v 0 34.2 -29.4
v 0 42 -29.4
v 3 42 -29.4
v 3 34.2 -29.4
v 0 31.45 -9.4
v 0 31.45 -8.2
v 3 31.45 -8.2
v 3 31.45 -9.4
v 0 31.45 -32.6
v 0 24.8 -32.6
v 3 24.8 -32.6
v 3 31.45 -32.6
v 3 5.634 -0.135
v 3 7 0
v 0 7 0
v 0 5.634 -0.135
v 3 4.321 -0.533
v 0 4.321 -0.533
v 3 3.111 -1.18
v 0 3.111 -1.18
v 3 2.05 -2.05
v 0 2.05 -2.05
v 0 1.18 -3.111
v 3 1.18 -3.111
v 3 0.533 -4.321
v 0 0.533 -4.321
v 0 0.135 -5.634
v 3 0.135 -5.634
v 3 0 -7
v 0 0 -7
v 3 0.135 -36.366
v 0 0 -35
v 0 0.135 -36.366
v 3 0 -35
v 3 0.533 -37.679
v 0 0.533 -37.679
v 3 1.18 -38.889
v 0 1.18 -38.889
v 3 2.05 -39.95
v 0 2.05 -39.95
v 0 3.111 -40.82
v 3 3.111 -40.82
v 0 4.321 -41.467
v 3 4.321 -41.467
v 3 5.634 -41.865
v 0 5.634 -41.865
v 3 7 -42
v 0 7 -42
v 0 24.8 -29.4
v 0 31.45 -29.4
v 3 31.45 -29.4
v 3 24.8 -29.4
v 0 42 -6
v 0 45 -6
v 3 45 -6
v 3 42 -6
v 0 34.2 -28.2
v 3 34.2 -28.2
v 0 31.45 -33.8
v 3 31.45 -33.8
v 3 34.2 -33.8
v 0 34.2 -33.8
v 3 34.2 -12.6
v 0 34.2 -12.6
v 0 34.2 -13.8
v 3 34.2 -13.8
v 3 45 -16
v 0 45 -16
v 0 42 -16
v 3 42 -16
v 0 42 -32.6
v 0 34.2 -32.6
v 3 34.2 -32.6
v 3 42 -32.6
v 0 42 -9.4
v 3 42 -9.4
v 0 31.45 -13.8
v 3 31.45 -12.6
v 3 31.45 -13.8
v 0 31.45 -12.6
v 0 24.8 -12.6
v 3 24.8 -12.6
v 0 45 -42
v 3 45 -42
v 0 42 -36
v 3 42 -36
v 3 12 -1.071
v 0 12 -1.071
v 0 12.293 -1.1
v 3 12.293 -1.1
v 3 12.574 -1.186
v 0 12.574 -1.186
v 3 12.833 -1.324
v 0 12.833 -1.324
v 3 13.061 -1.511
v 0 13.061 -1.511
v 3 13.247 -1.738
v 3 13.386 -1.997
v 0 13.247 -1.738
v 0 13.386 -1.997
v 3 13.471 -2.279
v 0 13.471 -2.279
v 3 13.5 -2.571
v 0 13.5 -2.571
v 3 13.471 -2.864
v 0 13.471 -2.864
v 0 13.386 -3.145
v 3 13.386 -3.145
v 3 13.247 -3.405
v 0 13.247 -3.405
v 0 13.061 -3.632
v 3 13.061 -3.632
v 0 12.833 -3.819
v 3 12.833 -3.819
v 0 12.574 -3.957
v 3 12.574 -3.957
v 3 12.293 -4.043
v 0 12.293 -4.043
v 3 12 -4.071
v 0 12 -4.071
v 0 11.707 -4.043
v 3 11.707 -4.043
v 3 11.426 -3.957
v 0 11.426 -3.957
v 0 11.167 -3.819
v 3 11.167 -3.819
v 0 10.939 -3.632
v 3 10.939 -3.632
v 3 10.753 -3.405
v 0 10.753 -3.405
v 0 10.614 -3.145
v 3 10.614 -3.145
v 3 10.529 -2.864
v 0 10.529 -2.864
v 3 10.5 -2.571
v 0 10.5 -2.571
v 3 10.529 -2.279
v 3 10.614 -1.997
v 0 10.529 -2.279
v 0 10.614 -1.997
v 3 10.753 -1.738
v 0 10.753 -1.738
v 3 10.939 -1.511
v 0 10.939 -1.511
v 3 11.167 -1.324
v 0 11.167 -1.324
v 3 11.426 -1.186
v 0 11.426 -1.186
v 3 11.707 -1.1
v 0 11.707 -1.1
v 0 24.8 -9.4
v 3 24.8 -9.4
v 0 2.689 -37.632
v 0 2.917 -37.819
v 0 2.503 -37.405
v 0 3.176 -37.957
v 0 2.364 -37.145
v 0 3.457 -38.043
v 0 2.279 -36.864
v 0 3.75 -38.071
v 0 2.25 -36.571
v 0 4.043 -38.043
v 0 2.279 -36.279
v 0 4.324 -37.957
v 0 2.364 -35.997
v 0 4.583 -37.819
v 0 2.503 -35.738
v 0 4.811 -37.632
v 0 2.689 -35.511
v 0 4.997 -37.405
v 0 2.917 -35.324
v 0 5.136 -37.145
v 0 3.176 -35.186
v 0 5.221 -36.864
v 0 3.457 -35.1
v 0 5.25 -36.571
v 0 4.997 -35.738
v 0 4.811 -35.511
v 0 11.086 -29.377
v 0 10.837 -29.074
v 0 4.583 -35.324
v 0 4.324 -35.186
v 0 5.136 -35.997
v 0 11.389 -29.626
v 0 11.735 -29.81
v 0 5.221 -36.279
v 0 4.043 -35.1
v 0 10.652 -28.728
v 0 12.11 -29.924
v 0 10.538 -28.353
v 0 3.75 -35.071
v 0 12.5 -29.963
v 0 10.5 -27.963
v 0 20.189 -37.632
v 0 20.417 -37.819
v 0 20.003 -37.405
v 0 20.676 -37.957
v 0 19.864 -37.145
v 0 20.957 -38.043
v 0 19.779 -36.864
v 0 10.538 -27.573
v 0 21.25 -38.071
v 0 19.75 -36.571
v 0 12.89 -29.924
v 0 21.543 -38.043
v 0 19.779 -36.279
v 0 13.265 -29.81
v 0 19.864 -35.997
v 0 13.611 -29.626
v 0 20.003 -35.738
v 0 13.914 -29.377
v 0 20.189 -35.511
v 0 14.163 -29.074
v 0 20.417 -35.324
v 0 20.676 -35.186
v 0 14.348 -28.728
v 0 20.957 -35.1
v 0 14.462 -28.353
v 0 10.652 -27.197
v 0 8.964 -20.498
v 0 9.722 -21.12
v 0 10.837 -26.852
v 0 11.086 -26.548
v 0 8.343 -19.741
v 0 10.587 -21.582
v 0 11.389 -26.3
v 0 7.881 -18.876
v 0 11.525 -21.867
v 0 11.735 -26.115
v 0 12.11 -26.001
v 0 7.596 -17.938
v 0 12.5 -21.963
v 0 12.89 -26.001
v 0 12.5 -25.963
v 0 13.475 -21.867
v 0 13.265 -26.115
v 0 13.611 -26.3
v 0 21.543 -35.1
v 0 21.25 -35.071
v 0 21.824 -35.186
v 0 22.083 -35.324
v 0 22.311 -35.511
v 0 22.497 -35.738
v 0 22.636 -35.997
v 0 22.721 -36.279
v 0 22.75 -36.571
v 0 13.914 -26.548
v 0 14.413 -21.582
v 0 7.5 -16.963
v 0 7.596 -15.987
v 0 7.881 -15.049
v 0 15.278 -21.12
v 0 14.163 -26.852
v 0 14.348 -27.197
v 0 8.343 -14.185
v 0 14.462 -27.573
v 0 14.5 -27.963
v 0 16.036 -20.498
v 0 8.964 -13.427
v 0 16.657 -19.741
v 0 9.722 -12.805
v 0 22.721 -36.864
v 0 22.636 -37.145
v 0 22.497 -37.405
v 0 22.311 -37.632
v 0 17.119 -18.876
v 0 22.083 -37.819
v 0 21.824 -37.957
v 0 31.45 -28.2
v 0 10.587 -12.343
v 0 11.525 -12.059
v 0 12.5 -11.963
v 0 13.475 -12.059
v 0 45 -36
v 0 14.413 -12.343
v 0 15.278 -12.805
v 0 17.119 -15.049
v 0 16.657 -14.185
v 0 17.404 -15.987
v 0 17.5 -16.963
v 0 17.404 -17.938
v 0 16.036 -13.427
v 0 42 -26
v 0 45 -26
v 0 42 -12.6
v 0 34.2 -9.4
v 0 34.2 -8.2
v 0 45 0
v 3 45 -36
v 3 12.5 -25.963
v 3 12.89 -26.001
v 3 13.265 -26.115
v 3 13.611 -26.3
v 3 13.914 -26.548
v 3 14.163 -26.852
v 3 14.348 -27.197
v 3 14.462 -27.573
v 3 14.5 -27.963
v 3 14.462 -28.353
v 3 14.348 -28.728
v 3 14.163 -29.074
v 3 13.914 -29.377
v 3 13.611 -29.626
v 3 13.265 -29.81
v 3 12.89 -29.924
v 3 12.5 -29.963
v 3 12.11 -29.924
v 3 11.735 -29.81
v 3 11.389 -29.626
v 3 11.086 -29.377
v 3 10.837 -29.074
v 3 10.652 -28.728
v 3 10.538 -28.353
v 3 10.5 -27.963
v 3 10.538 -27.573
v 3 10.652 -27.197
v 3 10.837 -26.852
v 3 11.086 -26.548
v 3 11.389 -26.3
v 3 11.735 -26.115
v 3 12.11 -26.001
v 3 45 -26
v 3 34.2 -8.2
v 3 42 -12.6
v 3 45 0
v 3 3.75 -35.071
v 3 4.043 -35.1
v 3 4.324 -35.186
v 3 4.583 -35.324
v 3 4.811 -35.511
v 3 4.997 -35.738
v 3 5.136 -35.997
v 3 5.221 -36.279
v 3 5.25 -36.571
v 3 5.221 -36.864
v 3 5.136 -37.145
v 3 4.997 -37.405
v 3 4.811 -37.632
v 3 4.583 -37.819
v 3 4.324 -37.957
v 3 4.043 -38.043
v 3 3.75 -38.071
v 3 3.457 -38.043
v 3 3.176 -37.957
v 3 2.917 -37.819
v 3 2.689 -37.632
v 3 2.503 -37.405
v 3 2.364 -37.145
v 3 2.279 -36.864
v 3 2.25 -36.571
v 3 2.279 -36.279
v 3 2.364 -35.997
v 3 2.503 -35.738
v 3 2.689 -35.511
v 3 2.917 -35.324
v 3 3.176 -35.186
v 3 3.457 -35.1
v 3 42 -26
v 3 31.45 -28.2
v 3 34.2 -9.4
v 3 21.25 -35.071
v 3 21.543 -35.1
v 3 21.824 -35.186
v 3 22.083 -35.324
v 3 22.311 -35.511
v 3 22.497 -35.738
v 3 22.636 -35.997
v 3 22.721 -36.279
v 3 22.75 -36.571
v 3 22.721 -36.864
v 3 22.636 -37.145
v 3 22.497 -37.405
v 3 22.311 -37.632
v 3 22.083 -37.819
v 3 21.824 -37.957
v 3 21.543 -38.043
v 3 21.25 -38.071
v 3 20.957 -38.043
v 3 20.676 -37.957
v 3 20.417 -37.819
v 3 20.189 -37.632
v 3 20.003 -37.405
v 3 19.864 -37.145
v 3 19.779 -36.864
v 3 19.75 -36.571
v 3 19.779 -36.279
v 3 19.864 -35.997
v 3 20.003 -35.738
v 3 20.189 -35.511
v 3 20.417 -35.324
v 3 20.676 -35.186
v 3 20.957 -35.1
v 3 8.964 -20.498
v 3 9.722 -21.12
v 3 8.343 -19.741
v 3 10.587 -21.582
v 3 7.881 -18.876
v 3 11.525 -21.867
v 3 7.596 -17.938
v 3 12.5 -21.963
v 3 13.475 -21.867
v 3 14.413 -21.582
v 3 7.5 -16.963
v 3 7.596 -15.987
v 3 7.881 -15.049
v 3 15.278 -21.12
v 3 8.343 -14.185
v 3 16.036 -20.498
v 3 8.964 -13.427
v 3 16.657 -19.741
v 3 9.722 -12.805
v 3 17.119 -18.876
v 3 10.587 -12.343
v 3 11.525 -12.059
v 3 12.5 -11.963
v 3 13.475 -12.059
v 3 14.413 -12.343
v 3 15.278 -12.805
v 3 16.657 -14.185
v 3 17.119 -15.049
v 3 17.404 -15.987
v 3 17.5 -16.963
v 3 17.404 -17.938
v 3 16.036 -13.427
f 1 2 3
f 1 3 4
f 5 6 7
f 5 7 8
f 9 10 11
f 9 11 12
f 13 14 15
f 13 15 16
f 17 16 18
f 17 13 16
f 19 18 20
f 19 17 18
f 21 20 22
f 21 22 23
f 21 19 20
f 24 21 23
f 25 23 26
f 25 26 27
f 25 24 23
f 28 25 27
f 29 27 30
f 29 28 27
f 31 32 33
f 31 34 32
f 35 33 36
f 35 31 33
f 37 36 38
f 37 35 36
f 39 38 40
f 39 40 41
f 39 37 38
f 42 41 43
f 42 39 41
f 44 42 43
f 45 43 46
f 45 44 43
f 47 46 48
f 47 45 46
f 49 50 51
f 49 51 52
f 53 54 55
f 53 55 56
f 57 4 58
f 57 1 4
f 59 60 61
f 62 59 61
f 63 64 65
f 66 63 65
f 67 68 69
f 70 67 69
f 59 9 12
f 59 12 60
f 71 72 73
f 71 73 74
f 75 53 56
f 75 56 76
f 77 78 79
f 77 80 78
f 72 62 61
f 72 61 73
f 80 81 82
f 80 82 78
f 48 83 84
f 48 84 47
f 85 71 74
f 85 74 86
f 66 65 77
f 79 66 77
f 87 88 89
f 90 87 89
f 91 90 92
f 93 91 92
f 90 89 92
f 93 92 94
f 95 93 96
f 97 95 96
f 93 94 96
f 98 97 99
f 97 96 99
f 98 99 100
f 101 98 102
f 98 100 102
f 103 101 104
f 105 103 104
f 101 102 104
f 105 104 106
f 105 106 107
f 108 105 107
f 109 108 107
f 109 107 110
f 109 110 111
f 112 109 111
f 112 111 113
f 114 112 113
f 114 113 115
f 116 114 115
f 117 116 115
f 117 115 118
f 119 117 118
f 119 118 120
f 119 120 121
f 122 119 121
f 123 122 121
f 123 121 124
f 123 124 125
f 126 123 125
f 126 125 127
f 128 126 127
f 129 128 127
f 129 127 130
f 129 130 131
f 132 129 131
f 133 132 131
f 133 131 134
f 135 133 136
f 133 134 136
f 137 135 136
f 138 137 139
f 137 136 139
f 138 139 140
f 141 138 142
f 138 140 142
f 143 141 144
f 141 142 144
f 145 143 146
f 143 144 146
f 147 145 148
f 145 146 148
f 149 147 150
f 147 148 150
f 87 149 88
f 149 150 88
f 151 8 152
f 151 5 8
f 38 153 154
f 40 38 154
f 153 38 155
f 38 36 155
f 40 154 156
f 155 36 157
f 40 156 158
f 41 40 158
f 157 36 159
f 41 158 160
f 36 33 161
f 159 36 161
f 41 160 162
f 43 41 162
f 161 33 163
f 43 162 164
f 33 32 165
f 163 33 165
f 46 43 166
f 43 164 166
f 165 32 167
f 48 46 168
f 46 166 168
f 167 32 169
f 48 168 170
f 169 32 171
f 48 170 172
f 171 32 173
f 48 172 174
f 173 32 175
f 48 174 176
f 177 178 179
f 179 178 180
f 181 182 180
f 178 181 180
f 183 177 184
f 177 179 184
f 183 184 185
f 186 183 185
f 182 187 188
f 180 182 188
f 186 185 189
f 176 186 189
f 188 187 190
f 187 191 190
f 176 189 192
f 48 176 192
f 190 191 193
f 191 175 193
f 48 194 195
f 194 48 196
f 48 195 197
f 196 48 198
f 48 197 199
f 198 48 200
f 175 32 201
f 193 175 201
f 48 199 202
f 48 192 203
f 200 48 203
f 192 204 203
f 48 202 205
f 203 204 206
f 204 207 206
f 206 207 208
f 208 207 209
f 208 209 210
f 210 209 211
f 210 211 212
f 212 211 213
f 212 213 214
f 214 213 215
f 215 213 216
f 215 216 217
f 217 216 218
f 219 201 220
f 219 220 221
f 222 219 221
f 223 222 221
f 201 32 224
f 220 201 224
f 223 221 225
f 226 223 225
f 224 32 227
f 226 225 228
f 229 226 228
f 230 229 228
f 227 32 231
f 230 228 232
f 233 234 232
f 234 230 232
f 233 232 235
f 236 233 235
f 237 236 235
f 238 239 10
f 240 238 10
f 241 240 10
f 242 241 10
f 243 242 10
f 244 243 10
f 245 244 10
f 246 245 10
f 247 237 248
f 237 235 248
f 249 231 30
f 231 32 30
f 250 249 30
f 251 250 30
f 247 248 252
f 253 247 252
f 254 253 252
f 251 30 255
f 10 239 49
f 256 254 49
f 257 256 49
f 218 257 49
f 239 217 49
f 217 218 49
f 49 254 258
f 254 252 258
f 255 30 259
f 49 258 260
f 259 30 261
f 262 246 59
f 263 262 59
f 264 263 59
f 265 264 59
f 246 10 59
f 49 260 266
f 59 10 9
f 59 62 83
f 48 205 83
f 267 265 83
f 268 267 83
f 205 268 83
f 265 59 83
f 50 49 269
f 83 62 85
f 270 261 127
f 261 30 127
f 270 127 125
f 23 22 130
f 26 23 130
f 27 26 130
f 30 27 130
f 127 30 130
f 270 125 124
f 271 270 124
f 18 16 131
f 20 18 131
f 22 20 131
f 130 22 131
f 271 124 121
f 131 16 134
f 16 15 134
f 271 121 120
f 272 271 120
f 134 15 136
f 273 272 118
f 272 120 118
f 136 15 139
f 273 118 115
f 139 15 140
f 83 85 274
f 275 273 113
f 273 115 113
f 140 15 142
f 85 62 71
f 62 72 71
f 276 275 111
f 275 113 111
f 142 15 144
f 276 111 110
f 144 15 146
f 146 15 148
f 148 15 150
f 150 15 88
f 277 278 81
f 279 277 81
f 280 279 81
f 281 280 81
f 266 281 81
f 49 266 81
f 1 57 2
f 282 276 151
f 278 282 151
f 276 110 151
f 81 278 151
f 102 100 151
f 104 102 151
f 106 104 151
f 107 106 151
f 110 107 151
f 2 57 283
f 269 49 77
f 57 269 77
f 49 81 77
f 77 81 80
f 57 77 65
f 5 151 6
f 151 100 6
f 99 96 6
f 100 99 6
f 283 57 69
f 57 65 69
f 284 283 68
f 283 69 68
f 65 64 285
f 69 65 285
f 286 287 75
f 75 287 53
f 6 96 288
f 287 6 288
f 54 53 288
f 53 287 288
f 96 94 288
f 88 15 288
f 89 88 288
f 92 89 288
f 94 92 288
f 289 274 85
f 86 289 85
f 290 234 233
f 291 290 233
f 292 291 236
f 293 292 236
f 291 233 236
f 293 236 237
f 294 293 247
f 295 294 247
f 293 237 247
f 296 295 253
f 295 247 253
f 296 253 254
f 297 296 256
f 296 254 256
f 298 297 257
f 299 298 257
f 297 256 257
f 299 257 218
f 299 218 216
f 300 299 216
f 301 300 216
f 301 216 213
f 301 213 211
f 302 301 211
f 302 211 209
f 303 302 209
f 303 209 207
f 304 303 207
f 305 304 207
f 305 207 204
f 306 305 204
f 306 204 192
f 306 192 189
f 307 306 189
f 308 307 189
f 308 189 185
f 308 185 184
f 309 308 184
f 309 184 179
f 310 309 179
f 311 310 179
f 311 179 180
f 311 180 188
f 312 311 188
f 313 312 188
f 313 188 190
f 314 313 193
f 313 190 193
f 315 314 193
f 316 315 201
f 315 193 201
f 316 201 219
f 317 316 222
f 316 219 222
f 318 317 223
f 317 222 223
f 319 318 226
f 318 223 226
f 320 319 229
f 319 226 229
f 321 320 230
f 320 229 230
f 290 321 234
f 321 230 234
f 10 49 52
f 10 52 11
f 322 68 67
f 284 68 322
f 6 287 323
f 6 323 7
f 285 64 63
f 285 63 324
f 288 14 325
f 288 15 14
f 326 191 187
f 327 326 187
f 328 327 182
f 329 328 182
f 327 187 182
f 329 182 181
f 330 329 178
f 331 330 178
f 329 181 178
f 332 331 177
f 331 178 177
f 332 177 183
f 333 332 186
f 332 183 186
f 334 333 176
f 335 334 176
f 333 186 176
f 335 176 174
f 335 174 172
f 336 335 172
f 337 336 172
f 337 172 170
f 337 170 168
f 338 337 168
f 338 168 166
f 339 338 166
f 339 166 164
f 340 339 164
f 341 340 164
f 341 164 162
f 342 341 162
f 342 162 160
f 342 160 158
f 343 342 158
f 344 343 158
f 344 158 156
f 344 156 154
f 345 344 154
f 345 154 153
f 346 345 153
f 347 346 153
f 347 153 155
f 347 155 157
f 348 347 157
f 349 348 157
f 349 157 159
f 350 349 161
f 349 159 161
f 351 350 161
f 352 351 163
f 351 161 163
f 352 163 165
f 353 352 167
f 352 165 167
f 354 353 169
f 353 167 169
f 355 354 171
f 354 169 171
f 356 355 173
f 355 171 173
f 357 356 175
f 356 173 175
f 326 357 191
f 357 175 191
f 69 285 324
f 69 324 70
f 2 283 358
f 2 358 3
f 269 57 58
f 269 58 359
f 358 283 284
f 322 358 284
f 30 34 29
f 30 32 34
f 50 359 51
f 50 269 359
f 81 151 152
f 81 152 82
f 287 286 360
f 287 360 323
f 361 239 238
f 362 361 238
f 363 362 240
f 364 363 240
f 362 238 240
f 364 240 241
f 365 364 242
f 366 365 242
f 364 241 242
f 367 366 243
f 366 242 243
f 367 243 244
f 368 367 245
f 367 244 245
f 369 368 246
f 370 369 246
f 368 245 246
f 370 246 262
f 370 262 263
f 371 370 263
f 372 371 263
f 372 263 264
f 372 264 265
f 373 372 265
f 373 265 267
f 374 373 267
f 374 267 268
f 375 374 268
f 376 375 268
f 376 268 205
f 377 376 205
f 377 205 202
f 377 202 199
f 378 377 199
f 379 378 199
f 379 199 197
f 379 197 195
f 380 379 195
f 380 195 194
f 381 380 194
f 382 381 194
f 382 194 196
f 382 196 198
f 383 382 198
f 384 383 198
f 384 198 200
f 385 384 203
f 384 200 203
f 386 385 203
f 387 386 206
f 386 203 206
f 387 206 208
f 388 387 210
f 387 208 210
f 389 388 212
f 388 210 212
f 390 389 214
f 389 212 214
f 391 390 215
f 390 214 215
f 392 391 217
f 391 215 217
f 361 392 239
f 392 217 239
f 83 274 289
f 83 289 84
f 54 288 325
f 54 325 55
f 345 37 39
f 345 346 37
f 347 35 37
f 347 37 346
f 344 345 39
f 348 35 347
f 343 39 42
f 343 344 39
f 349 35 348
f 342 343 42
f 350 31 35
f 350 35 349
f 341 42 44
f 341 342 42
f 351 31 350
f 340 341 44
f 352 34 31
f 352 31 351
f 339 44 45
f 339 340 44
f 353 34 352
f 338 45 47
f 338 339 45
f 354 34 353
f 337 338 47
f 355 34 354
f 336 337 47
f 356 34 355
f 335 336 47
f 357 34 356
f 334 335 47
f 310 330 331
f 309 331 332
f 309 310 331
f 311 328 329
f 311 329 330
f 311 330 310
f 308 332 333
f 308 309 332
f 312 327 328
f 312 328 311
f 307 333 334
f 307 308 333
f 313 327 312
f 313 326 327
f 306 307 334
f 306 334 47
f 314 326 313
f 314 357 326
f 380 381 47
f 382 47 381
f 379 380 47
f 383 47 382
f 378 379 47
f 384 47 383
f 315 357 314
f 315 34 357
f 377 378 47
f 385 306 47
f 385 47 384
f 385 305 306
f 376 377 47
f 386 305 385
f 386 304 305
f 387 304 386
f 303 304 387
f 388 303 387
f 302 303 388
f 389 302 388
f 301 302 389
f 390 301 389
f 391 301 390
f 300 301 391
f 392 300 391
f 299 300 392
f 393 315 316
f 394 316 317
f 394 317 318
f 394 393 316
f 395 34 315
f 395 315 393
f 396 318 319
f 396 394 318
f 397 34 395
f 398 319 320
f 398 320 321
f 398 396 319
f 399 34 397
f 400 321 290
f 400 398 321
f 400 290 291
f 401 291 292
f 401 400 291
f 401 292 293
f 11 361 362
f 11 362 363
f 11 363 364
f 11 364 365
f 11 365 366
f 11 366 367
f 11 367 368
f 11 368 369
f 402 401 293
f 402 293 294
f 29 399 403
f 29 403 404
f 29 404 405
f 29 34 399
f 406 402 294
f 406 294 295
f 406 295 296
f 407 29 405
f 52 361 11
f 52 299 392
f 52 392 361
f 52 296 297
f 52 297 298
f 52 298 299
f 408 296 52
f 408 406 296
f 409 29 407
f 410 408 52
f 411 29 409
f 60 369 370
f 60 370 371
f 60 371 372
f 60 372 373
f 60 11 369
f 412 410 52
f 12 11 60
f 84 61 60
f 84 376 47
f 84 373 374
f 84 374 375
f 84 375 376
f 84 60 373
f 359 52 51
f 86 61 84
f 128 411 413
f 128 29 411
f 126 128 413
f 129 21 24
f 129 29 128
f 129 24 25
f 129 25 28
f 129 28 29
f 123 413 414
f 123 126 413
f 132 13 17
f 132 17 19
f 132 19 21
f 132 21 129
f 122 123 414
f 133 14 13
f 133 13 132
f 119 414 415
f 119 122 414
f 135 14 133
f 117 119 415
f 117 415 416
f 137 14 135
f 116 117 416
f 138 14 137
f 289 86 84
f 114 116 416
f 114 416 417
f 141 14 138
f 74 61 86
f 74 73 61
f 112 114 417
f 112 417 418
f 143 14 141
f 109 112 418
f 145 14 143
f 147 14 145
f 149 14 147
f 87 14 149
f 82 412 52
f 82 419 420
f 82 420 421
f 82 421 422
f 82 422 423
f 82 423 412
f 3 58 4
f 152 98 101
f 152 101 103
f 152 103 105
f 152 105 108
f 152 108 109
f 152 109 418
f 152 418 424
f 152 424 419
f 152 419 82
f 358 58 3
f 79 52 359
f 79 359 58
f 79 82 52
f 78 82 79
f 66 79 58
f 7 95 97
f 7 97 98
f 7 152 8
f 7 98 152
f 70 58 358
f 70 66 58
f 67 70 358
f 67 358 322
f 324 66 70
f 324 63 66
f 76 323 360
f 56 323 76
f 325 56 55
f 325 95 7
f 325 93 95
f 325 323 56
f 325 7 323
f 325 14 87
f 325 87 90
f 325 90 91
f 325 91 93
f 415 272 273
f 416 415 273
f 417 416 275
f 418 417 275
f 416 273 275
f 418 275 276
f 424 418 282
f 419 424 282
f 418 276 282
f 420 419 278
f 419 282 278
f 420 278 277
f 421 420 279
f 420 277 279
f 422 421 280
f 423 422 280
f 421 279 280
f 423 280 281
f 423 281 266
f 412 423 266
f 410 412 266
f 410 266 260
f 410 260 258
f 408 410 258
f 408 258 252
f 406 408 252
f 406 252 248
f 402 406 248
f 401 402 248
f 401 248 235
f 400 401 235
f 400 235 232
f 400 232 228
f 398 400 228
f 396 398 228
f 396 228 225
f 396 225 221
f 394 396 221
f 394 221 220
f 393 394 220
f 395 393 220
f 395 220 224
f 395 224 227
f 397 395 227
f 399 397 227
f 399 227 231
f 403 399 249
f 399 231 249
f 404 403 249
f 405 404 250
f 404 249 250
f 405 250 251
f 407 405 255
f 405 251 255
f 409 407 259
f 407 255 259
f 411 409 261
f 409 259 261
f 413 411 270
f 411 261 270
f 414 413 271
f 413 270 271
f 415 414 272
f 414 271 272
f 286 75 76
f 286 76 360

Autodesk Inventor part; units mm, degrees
ref_plane "YZ Plane" through (0, 0, 0) normal (1, 0, 0) x (0, 1, 0)
ref_plane "XZ Plane" through (0, 0, 0) normal (0, 1, 0) x (-1, 0, 0)
ref_plane "XY Plane" through (0, 0, 0) normal (0, 0, 1) x (1, 0, 0)
sketch "Sketch1" plane through (0, 0, 0) normal (1, 0, 0) x (0, 1, 0)
  line L0 (0, 0) -> (45, 0)
  line L1 (45, 0) -> (45, -42)
  line L2 (45, -42) -> (0, -42)
  line L3 (0, -42) -> (0, 0)
  dimension "d0" = 45
  dimension "d1" = 42
extrude "Extrusion1" add sketch "Sketch1" along normal blind 3
sketch "Sketch4" plane through (0, 0, 0) normal (-1, 0, 0) x (0, 0, 1)
  circle A0 centre (-2.5714, 12) radius 1.5
  circle A1 centre (-36.5714, 21.25) radius 1.5
  circle A2 centre (-36.5714, 3.75) radius 1.5
  circle A3 centre (-16.9627, 12.5) radius 5
  line L0 (-42, 0) -> (0, 0) projected
  circle A4 centre (-27.9627, 12.5) radius 2
  point P0 (0, 10)
  point P1 (-32, 0)
  point P2 (-10, 0)
  dimension "d21" = 3
  dimension "d23" = 3
  dimension "d26" = 3
  dimension "d29" = 10
  dimension "d32" = 12.5
  dimension "d76" = 4
  dimension "d77" = 4
  dimension "d78" = 12.5
  dimension "d79" = 7.9
extrude "Extrusion4" cut sketch "Sketch4" against normal blind 4
sketch "Sketch5" plane through (0, 0, 0) normal (-1, 0, 0) x (0, 0, 1)
  line L0 (-16, 45) -> (-16, 42)
  line L1 (-26, 42) -> (-26, 45)
  line L2 (-36, 45) -> (-36, 42)
  line L3 (-42, 42) -> (-42, 45)
  line L4 (-6, 45) -> (-6, 42)
  line L5 (-42, 45) -> (0, 45) projected
  line L6 (-6, 45) -> (-16, 45)
  line L7 (-16, 42) -> (-16, 45)
  line L8 (-26, 45) -> (-36, 45)
  line L9 (-9.4, 24.8) -> (-12.6, 24.8)
  line L10 (-9.4, 34.2) -> (-8.2, 34.2)
  line L11 (-8.2, 34.2) -> (-8.2, 31.45)
  line L12 (-8.2, 31.45) -> (-9.4, 31.45)
  line L13 (-12.6, 34.2) -> (-13.8, 34.2)
  line L14 (-13.8, 34.2) -> (-13.8, 31.45)
  line L15 (-12.6, 31.45) -> (-13.8, 31.45)
  line L16 (-9.4, 42) -> (-9.4, 34.2)
  line L17 (-9.4, 31.45) -> (-9.4, 24.8)
  line L18 (-12.6, 24.8) -> (-12.6, 31.45)
  line L19 (-12.6, 34.2) -> (-12.6, 42)
  line L20 (-6, 42) -> (-9.4, 42)
  line L21 (-12.6, 42) -> (-16, 42)
  line L22 (-26, 42) -> (-29.4, 42)
  line L23 (-29.4, 42) -> (-29.4, 34.2)
  line L24 (-29.4, 34.2) -> (-28.2, 34.2)
  line L25 (-28.2, 34.2) -> (-28.2, 31.45)
  line L26 (-28.2, 31.45) -> (-29.4, 31.45)
  line L27 (-29.4, 31.45) -> (-29.4, 24.8)
  line L28 (-29.4, 24.8) -> (-32.6, 24.8)
  line L29 (-32.6, 24.8) -> (-32.6, 31.45)
  line L30 (-32.6, 31.45) -> (-33.8, 31.45)
  line L31 (-33.8, 31.45) -> (-33.8, 34.2)
  line L32 (-33.8, 34.2) -> (-32.6, 34.2)
  line L33 (-32.6, 34.2) -> (-32.6, 42)
  line L34 (-32.6, 42) -> (-36, 42)
  dimension "d38" = 10
  dimension "d42" = 6
  dimension "d47" = 10
  dimension "d48" = 10
  dimension "d55" = 2.75
  dimension "d59" = 3
  dimension "d60" = 7.8
  dimension "d61" = 6.65
  dimension "d62" = 5.6
  dimension "d63" = 3.2
  dimension "d64" = 3.4
  dimension "d65" = 3.4
  dimension "d66" = 7.8
  dimension "d67" = 1.2
  dimension "d68" = 1.2
  dimension "d69" = 2.75
  dimension "d70" = 3.2
  dimension "d71" = 1.2
  dimension "d72" = 1.2
  dimension "d73" = 6.65
  dimension "d74" = 7.8
  dimension "d75" = 20.2
extrude "Extrusion5" cut sketch "Sketch5" against normal blind 4
fillet "Fillet2" radius 7 2 edges at (1.5, 0, 0) (1.5, 0, -42)
properties part number "motor mount" material "Plywood, Finish"
